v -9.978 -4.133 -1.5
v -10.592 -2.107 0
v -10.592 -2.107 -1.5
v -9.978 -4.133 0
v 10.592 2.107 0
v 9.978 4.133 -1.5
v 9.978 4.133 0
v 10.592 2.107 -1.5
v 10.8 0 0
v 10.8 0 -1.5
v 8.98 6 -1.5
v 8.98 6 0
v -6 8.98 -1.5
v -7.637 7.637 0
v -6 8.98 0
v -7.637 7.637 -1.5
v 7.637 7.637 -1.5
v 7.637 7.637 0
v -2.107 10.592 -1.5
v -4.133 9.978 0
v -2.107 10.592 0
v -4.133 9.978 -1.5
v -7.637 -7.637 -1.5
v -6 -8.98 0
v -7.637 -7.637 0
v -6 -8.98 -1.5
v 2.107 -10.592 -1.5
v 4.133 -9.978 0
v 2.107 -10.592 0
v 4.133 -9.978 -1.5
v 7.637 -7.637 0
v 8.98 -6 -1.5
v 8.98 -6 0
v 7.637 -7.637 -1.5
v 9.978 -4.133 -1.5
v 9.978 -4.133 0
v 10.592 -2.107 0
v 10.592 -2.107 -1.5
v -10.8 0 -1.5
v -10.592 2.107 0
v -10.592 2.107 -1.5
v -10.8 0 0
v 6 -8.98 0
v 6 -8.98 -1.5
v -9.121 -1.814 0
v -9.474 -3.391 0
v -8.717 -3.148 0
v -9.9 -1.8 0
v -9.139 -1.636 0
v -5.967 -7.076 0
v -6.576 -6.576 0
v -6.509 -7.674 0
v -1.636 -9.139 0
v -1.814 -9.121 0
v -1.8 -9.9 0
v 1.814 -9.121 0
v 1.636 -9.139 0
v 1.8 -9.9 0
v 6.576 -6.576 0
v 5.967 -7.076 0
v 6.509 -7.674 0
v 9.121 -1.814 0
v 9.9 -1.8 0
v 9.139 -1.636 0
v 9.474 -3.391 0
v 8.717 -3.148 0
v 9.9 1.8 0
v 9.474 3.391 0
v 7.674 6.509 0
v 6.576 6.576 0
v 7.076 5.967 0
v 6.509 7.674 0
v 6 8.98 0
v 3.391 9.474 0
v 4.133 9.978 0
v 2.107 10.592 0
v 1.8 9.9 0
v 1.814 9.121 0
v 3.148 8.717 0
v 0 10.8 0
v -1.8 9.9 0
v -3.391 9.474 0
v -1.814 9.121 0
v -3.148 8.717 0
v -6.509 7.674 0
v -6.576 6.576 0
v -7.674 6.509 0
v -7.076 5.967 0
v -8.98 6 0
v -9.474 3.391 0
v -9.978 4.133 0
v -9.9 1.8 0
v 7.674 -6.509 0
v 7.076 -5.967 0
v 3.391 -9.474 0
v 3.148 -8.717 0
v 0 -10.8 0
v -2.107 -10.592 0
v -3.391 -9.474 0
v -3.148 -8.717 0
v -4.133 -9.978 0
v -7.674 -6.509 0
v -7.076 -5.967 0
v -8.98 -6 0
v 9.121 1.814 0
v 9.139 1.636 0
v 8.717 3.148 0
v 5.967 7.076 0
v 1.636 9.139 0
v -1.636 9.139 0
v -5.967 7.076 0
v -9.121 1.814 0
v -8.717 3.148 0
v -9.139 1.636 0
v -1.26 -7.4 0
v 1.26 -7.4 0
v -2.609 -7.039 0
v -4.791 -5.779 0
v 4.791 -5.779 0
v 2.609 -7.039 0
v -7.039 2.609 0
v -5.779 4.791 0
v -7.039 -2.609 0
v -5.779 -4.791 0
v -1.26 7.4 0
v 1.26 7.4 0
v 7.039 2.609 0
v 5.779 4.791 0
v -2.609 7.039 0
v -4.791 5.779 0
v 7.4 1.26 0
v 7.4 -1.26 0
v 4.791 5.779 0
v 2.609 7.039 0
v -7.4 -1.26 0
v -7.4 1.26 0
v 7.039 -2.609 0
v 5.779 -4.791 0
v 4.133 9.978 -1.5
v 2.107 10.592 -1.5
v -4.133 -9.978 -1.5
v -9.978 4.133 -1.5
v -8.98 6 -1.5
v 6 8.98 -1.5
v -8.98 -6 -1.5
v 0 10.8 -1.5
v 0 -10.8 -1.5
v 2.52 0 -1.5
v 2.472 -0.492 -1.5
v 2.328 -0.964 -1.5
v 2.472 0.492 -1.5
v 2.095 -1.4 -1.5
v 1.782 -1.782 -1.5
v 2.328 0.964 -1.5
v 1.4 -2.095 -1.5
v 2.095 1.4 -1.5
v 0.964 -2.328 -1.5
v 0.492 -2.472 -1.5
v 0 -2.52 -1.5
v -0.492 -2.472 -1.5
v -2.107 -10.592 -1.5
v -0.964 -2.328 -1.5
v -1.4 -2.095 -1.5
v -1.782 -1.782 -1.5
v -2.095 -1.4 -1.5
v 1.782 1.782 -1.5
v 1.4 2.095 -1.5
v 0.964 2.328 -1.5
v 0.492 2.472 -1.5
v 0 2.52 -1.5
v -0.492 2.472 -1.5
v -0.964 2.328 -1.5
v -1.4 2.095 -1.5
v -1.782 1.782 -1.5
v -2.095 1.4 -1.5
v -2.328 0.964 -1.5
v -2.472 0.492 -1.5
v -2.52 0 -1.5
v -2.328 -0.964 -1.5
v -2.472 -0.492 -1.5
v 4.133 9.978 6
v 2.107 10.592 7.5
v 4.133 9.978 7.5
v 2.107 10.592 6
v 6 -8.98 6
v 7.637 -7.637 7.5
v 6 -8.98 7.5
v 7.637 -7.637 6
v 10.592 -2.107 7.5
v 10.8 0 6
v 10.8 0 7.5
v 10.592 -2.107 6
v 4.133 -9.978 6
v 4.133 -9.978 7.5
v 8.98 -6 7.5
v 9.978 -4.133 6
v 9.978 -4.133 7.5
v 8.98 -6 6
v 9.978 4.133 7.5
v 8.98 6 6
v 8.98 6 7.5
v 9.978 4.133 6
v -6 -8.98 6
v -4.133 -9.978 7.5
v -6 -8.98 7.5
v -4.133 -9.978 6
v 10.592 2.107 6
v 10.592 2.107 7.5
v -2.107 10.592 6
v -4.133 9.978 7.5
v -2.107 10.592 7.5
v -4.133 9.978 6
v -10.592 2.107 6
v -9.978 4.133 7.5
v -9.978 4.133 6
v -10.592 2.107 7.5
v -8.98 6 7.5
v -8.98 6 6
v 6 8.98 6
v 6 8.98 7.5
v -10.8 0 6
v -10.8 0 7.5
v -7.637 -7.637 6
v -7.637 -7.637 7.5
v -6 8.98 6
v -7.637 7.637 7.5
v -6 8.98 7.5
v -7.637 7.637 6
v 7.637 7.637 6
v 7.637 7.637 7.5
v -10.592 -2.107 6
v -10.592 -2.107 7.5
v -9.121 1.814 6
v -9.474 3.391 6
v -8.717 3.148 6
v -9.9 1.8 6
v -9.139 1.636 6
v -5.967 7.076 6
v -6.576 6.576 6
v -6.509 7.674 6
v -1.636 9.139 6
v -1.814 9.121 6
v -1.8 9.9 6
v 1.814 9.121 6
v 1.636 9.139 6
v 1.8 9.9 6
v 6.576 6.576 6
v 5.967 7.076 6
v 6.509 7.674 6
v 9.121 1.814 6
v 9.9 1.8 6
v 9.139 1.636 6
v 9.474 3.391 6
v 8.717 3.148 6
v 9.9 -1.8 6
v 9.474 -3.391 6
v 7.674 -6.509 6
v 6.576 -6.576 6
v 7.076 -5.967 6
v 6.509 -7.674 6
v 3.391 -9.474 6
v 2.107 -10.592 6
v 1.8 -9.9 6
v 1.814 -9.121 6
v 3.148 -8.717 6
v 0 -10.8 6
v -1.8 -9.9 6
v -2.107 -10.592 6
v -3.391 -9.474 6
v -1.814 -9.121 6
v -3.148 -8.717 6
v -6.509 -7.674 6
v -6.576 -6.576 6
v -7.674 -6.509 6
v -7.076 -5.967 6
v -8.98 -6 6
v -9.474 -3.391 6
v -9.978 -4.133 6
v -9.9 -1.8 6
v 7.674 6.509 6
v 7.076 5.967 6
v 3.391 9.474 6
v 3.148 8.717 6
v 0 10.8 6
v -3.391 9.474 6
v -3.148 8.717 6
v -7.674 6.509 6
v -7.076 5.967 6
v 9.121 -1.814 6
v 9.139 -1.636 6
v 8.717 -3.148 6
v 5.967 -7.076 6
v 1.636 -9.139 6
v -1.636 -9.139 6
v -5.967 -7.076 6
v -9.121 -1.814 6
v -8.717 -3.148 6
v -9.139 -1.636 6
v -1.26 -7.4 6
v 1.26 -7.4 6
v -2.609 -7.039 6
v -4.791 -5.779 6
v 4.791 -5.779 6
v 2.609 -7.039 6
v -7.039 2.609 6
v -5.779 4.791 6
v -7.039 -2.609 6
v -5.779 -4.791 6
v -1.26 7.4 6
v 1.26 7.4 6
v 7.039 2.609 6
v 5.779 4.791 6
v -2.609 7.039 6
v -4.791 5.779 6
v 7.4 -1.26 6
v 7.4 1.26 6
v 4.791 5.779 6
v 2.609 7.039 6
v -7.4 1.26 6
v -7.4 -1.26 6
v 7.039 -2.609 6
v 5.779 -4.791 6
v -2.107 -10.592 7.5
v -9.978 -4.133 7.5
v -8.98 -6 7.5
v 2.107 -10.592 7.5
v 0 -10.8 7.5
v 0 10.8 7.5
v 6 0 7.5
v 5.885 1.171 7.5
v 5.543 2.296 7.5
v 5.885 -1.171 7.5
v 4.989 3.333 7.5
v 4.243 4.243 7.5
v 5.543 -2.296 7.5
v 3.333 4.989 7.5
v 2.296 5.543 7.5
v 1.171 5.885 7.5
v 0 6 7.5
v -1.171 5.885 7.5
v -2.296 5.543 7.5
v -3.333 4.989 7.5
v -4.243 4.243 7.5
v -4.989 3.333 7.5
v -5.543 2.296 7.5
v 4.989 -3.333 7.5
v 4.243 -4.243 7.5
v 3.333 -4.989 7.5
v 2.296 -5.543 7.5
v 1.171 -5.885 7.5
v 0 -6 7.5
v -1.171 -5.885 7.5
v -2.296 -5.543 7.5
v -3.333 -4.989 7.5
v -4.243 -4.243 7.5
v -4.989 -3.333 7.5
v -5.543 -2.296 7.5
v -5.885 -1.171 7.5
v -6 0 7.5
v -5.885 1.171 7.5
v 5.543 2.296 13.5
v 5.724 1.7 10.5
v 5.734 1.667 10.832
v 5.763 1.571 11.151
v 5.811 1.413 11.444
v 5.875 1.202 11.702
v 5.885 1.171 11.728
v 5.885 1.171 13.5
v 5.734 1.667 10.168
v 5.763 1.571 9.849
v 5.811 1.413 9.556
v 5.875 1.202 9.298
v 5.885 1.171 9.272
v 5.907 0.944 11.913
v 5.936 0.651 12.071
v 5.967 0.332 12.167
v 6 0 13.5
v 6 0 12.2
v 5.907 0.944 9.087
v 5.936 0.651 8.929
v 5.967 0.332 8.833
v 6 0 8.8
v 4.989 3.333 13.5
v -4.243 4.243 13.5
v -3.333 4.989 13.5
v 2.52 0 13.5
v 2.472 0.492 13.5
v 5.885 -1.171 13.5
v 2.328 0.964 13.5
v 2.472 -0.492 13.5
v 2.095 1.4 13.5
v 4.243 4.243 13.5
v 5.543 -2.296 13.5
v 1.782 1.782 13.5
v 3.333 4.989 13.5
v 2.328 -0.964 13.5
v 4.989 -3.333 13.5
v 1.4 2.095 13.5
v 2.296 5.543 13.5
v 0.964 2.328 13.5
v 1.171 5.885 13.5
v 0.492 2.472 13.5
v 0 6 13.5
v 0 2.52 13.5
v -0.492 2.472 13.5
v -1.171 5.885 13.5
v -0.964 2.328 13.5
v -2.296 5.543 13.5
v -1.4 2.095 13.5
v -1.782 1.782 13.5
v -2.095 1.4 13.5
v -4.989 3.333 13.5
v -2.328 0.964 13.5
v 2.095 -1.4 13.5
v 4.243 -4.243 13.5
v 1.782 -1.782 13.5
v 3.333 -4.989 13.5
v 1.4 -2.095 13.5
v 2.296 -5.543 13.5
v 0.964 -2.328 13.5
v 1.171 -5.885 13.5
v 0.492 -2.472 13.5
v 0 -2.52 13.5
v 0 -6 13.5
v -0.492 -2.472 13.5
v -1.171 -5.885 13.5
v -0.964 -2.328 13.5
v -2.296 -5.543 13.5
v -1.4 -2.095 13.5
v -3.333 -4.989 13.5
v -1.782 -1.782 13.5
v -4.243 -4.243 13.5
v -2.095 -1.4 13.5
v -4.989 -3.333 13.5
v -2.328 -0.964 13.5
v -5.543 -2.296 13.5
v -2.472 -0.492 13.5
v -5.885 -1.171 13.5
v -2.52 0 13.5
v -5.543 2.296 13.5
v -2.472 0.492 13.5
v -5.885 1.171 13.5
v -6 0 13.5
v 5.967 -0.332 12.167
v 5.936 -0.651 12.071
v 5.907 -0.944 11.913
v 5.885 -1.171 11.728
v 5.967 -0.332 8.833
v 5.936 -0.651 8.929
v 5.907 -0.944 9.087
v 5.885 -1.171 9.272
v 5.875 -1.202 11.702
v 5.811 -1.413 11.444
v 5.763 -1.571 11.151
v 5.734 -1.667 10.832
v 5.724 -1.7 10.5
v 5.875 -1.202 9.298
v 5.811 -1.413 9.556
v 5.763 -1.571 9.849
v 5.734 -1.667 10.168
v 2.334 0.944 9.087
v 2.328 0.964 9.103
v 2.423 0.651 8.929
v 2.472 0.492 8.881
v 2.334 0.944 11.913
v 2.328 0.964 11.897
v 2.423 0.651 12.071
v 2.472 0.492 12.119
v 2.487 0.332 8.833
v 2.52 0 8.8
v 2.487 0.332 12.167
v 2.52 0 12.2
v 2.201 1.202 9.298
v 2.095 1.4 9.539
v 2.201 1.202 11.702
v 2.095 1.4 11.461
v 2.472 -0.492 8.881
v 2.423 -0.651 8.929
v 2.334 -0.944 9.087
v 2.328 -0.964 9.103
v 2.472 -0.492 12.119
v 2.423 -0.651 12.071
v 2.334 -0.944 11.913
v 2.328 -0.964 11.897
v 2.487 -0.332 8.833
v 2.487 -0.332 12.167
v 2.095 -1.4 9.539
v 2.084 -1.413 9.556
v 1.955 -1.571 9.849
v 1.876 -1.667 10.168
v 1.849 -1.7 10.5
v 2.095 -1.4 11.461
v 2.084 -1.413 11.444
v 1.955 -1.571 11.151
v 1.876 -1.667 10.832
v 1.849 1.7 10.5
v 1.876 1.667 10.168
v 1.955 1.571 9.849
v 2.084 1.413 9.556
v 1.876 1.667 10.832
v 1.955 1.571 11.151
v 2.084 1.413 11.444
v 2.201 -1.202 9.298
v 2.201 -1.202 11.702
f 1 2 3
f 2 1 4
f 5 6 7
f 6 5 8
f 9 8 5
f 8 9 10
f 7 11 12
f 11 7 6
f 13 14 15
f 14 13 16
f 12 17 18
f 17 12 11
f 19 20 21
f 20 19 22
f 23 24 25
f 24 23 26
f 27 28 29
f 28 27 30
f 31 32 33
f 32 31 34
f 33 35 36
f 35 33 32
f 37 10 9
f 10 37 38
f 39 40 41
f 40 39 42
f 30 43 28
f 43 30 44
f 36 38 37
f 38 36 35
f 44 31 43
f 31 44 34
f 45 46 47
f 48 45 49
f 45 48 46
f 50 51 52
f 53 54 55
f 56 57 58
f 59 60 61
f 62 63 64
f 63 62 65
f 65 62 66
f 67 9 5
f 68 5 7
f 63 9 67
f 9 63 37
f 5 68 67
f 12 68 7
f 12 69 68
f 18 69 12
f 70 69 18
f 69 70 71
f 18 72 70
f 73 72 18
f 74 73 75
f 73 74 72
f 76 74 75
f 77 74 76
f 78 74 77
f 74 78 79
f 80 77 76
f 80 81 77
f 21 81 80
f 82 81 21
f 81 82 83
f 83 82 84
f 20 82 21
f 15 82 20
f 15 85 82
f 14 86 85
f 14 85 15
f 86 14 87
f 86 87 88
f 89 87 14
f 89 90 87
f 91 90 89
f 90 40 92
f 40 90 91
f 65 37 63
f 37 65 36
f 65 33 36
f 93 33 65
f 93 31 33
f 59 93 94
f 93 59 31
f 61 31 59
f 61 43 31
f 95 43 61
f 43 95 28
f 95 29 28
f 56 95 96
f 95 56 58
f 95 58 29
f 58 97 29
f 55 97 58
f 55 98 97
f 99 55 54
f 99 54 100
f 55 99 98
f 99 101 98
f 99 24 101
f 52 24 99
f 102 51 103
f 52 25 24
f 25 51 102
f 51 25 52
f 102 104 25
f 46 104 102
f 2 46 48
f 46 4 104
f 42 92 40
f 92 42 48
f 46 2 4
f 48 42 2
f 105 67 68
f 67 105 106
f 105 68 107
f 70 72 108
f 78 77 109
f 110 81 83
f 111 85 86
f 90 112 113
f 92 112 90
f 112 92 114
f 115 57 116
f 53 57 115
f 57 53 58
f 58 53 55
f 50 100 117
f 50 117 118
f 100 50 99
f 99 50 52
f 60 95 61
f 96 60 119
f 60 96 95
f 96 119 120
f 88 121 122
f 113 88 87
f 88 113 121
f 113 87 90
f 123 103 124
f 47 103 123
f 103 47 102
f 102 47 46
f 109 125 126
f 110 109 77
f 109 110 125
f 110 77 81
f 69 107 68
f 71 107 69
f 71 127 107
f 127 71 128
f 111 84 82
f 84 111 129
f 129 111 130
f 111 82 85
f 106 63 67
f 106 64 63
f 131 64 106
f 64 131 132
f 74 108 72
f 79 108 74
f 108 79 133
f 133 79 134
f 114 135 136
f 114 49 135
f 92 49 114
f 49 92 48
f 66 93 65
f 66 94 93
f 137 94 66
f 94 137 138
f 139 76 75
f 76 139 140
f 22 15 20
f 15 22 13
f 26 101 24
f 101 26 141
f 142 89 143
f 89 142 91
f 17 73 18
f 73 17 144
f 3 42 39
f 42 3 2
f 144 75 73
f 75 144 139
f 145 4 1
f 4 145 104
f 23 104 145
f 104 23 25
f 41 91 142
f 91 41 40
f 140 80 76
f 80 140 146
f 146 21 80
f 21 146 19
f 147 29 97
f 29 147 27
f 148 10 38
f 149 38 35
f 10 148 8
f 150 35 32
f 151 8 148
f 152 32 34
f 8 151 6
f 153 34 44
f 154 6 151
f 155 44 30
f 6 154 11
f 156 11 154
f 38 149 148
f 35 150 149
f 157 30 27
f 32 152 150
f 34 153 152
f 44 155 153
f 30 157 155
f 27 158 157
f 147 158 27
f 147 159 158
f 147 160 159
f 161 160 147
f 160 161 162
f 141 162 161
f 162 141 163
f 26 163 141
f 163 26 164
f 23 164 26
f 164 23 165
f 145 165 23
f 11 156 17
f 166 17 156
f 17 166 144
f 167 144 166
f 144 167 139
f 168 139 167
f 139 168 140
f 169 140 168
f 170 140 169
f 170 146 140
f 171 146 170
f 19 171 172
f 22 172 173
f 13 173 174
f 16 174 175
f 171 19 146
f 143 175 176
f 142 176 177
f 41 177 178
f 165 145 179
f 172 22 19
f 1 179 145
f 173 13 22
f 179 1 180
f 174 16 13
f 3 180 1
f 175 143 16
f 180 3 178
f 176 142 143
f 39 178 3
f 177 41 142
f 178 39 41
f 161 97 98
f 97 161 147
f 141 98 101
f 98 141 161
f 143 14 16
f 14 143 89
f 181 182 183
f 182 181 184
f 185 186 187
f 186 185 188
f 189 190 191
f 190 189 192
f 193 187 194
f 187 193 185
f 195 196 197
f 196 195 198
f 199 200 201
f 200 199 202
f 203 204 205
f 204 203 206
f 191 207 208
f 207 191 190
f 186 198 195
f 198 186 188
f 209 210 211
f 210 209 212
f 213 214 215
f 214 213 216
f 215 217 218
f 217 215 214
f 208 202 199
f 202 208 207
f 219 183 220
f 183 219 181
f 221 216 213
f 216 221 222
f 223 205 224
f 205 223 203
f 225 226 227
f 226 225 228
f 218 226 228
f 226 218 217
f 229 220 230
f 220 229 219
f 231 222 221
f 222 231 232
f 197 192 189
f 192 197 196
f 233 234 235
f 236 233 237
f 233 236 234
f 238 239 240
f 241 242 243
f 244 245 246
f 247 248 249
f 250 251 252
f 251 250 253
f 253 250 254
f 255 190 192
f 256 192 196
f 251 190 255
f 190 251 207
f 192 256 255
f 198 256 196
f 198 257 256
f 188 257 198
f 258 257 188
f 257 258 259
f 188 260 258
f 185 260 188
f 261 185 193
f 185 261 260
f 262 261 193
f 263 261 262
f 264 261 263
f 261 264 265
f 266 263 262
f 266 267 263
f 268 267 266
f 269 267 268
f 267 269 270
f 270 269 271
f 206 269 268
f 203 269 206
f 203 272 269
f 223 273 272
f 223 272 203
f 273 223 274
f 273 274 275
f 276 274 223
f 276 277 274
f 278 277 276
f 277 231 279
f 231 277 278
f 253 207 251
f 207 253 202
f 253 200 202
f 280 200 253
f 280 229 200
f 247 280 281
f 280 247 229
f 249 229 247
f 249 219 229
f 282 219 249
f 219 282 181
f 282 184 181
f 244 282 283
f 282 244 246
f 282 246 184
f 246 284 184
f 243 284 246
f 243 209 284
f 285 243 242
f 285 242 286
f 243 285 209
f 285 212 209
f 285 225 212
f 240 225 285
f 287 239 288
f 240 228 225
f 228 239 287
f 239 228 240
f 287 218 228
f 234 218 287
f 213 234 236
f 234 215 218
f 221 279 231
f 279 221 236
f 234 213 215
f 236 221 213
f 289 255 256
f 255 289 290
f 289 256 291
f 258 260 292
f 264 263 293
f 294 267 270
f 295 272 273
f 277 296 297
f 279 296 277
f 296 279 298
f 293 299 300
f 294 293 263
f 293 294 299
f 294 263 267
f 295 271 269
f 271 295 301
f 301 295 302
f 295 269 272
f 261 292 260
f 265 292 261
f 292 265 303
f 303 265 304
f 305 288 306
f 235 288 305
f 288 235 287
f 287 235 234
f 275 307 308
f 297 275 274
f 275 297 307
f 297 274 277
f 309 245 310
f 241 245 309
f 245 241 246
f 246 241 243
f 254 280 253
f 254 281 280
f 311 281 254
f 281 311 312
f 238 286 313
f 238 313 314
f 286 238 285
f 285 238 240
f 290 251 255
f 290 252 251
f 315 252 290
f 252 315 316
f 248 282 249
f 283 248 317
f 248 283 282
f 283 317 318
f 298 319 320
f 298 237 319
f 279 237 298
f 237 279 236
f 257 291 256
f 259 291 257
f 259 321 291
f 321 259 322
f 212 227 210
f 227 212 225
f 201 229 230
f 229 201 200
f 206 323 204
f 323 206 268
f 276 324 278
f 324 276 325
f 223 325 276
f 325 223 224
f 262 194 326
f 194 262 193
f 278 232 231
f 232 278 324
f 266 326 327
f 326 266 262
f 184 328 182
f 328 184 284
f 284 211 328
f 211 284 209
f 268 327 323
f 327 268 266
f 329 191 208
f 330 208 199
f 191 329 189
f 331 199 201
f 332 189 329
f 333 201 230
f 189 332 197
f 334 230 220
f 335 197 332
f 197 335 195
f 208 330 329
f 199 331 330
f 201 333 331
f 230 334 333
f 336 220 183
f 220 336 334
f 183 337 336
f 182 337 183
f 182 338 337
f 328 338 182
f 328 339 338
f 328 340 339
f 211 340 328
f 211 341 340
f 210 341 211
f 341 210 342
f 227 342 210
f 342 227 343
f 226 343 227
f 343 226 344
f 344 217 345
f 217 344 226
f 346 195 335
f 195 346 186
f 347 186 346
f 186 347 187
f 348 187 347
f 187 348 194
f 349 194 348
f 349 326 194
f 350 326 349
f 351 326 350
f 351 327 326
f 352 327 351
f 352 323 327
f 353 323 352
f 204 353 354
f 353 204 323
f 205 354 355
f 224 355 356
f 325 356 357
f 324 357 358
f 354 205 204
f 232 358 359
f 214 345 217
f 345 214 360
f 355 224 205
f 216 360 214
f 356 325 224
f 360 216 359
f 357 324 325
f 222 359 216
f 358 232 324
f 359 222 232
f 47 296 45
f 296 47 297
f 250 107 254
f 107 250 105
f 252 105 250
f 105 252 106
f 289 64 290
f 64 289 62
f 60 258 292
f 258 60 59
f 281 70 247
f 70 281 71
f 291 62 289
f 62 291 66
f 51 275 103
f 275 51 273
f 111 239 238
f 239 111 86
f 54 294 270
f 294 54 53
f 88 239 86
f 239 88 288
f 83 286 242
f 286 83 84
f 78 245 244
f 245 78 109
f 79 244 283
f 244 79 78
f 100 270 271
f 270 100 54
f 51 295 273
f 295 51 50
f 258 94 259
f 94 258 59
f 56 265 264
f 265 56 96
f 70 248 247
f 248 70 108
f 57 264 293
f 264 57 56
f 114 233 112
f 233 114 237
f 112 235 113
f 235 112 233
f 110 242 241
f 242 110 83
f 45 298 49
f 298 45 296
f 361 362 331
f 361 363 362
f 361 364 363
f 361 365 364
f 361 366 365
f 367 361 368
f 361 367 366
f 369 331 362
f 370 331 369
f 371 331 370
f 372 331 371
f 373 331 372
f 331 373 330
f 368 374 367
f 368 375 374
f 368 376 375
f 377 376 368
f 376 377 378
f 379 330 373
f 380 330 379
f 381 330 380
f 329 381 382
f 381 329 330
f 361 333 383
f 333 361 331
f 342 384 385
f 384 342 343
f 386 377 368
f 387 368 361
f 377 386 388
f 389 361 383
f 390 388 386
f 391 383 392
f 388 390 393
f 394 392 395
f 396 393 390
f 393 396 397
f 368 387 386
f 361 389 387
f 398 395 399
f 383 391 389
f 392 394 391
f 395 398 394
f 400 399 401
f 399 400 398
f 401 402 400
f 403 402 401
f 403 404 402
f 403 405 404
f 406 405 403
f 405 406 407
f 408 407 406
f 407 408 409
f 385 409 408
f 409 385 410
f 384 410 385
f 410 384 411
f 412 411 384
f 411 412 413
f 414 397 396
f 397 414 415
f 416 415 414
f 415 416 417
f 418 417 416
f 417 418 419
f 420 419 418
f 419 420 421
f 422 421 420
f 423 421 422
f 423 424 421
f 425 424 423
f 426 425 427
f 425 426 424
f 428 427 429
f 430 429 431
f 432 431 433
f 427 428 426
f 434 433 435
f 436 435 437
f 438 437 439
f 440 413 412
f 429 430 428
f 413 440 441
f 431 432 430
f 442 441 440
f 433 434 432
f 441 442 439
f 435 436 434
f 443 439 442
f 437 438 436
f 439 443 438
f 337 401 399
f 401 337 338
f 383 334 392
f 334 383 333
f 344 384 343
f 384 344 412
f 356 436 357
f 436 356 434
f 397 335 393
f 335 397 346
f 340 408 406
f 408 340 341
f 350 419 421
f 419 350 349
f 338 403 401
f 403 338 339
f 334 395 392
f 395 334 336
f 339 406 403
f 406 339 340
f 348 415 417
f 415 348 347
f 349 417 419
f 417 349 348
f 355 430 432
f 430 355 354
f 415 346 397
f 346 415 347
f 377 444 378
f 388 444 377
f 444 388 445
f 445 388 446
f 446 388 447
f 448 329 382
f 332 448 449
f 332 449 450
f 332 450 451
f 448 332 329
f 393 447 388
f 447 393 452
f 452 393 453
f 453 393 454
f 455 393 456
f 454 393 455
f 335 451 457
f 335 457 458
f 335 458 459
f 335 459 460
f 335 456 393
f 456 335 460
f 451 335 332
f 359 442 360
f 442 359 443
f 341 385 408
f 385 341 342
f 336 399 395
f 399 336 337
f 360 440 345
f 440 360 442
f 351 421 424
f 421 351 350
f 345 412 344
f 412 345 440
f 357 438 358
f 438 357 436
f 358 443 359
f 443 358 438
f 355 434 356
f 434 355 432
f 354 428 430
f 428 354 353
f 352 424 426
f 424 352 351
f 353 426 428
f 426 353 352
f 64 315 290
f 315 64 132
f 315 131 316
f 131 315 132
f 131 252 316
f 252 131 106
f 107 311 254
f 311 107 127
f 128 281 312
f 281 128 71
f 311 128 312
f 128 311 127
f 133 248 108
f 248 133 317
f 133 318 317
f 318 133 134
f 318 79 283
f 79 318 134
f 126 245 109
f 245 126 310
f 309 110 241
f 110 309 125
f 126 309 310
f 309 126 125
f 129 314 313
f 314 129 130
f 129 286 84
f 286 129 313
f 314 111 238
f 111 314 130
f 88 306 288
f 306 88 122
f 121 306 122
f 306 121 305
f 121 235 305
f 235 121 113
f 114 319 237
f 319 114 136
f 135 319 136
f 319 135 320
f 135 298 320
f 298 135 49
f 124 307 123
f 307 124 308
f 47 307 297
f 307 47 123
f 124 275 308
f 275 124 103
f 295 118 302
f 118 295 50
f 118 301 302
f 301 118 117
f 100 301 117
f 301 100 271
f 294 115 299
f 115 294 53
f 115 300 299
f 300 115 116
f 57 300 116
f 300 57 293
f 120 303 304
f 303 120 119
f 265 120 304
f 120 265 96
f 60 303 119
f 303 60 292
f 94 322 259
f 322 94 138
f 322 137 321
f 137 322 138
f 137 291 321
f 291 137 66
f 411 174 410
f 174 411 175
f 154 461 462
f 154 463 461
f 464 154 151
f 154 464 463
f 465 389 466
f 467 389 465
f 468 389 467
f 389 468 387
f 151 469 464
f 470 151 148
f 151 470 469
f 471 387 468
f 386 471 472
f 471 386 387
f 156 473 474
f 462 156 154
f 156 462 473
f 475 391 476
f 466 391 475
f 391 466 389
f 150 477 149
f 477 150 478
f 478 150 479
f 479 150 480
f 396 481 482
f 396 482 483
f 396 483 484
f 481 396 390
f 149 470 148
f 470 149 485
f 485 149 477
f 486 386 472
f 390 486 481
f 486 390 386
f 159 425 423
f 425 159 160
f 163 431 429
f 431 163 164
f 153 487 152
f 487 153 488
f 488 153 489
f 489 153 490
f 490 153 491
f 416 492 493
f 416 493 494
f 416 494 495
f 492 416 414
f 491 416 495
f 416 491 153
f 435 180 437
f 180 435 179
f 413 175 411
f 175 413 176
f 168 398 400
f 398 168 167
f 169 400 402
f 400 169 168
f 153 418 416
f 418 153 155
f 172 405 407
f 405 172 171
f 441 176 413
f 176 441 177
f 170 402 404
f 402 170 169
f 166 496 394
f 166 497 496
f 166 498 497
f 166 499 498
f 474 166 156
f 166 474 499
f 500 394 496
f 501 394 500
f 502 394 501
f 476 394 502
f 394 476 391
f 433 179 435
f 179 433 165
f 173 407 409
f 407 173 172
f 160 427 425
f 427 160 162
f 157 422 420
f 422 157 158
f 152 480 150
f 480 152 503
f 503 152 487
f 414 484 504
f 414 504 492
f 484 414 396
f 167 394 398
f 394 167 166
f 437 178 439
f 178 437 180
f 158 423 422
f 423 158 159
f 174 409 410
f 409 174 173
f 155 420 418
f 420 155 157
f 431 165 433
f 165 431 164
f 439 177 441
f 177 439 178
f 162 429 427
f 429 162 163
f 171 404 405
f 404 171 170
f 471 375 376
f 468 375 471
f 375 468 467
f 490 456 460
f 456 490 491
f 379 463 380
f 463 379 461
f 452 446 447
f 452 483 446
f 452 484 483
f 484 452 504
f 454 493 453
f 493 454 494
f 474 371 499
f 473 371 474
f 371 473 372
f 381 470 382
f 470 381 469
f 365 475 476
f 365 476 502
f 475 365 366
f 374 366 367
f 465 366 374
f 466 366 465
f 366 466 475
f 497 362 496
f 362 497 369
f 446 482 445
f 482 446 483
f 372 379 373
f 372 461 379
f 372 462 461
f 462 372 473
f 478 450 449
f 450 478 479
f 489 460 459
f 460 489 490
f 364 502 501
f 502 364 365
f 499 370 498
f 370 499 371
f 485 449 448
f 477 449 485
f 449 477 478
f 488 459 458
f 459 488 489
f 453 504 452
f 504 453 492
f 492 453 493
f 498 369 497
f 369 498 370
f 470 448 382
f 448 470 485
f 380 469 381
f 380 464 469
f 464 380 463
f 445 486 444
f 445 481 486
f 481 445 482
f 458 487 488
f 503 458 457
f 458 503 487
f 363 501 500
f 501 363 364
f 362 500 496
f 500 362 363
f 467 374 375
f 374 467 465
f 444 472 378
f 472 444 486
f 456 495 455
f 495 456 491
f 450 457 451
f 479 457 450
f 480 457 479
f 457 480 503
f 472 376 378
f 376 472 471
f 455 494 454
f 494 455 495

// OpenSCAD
$fn = 32;

// ----------------------------------------------------------------------
// Timing pulley: T5 12T, pitch 5 mm, 21.6 mm x 15 mm
// ----------------------------------------------------------------------

// --- parameters (mm) ---
belt_pitch = 5;           // belt pitch
n_teeth = 12;             // number of grooves
rim_w = 6;                // belt width between the flanges
tip_d = 18.6;             // tip circle diameter
root_d = 16;              // groove bottom diameter
groove_h = 1.3;           // groove depth
tooth_w = 3;              // groove width at the tip circle
rim_d = 21.6;             // flange diameter
rim_t = 1.5;              // flange thickness
spigot_d = 14.4;          // flange spigot, sunk into the rim
spigot_h = 1.2;           // spigot depth into the rim
shaft_d = 5.04;           // shaft bore
hub_d = 12;               // hub diameter
hub_h = 6;                // hub above the flange
bottom_z = -1.5;          // lowest point of the pulley
top_z = 13.5;             // highest point of the pulley
set_d = 3.4;              // set screw tap hole

module rim() {
  cylinder(h = rim_w, d = tip_d);
}

module groove_cutter() {
  /* belt tooth groove: deeper than wide, cut through the belt width */
  translate([root_d / 2, 0, 0])
    linear_extrude(height = rim_w)
      polygon(points = [[-0.6, -tooth_w * 0.42], [groove_h + 0.6, -tooth_w * 0.6],
                        [groove_h + 0.6, tooth_w * 0.6], [-0.6, tooth_w * 0.42]]);
}

module flanges() {
  translate([0, 0, -rim_t]) cylinder(h = rim_t, d = rim_d);
  translate([0, 0, rim_w]) cylinder(h = rim_t, d = rim_d);
  translate([0, 0, -spigot_h]) cylinder(h = spigot_h + 0.6, d = spigot_d);
  translate([0, 0, rim_w - 0.6]) cylinder(h = spigot_h + 0.6, d = spigot_d);
}

module hub() {
  translate([0, 0, bottom_z]) cylinder(h = top_z - bottom_z, d = hub_d);
}

difference() {
  union() {
    rim();
    hub();
    flanges();
  }
  for (i = [0 : n_teeth - 1]) rotate([0, 0, i * 360 / n_teeth]) groove_cutter();
  translate([0, 0, bottom_z - 1]) cylinder(h = top_z - bottom_z + 2, d = shaft_d);
  translate([-1, 0, top_z - hub_h * 0.5]) rotate([0, 90, 0]) cylinder(h = hub_d / 2 + 3, d = set_d);
}
